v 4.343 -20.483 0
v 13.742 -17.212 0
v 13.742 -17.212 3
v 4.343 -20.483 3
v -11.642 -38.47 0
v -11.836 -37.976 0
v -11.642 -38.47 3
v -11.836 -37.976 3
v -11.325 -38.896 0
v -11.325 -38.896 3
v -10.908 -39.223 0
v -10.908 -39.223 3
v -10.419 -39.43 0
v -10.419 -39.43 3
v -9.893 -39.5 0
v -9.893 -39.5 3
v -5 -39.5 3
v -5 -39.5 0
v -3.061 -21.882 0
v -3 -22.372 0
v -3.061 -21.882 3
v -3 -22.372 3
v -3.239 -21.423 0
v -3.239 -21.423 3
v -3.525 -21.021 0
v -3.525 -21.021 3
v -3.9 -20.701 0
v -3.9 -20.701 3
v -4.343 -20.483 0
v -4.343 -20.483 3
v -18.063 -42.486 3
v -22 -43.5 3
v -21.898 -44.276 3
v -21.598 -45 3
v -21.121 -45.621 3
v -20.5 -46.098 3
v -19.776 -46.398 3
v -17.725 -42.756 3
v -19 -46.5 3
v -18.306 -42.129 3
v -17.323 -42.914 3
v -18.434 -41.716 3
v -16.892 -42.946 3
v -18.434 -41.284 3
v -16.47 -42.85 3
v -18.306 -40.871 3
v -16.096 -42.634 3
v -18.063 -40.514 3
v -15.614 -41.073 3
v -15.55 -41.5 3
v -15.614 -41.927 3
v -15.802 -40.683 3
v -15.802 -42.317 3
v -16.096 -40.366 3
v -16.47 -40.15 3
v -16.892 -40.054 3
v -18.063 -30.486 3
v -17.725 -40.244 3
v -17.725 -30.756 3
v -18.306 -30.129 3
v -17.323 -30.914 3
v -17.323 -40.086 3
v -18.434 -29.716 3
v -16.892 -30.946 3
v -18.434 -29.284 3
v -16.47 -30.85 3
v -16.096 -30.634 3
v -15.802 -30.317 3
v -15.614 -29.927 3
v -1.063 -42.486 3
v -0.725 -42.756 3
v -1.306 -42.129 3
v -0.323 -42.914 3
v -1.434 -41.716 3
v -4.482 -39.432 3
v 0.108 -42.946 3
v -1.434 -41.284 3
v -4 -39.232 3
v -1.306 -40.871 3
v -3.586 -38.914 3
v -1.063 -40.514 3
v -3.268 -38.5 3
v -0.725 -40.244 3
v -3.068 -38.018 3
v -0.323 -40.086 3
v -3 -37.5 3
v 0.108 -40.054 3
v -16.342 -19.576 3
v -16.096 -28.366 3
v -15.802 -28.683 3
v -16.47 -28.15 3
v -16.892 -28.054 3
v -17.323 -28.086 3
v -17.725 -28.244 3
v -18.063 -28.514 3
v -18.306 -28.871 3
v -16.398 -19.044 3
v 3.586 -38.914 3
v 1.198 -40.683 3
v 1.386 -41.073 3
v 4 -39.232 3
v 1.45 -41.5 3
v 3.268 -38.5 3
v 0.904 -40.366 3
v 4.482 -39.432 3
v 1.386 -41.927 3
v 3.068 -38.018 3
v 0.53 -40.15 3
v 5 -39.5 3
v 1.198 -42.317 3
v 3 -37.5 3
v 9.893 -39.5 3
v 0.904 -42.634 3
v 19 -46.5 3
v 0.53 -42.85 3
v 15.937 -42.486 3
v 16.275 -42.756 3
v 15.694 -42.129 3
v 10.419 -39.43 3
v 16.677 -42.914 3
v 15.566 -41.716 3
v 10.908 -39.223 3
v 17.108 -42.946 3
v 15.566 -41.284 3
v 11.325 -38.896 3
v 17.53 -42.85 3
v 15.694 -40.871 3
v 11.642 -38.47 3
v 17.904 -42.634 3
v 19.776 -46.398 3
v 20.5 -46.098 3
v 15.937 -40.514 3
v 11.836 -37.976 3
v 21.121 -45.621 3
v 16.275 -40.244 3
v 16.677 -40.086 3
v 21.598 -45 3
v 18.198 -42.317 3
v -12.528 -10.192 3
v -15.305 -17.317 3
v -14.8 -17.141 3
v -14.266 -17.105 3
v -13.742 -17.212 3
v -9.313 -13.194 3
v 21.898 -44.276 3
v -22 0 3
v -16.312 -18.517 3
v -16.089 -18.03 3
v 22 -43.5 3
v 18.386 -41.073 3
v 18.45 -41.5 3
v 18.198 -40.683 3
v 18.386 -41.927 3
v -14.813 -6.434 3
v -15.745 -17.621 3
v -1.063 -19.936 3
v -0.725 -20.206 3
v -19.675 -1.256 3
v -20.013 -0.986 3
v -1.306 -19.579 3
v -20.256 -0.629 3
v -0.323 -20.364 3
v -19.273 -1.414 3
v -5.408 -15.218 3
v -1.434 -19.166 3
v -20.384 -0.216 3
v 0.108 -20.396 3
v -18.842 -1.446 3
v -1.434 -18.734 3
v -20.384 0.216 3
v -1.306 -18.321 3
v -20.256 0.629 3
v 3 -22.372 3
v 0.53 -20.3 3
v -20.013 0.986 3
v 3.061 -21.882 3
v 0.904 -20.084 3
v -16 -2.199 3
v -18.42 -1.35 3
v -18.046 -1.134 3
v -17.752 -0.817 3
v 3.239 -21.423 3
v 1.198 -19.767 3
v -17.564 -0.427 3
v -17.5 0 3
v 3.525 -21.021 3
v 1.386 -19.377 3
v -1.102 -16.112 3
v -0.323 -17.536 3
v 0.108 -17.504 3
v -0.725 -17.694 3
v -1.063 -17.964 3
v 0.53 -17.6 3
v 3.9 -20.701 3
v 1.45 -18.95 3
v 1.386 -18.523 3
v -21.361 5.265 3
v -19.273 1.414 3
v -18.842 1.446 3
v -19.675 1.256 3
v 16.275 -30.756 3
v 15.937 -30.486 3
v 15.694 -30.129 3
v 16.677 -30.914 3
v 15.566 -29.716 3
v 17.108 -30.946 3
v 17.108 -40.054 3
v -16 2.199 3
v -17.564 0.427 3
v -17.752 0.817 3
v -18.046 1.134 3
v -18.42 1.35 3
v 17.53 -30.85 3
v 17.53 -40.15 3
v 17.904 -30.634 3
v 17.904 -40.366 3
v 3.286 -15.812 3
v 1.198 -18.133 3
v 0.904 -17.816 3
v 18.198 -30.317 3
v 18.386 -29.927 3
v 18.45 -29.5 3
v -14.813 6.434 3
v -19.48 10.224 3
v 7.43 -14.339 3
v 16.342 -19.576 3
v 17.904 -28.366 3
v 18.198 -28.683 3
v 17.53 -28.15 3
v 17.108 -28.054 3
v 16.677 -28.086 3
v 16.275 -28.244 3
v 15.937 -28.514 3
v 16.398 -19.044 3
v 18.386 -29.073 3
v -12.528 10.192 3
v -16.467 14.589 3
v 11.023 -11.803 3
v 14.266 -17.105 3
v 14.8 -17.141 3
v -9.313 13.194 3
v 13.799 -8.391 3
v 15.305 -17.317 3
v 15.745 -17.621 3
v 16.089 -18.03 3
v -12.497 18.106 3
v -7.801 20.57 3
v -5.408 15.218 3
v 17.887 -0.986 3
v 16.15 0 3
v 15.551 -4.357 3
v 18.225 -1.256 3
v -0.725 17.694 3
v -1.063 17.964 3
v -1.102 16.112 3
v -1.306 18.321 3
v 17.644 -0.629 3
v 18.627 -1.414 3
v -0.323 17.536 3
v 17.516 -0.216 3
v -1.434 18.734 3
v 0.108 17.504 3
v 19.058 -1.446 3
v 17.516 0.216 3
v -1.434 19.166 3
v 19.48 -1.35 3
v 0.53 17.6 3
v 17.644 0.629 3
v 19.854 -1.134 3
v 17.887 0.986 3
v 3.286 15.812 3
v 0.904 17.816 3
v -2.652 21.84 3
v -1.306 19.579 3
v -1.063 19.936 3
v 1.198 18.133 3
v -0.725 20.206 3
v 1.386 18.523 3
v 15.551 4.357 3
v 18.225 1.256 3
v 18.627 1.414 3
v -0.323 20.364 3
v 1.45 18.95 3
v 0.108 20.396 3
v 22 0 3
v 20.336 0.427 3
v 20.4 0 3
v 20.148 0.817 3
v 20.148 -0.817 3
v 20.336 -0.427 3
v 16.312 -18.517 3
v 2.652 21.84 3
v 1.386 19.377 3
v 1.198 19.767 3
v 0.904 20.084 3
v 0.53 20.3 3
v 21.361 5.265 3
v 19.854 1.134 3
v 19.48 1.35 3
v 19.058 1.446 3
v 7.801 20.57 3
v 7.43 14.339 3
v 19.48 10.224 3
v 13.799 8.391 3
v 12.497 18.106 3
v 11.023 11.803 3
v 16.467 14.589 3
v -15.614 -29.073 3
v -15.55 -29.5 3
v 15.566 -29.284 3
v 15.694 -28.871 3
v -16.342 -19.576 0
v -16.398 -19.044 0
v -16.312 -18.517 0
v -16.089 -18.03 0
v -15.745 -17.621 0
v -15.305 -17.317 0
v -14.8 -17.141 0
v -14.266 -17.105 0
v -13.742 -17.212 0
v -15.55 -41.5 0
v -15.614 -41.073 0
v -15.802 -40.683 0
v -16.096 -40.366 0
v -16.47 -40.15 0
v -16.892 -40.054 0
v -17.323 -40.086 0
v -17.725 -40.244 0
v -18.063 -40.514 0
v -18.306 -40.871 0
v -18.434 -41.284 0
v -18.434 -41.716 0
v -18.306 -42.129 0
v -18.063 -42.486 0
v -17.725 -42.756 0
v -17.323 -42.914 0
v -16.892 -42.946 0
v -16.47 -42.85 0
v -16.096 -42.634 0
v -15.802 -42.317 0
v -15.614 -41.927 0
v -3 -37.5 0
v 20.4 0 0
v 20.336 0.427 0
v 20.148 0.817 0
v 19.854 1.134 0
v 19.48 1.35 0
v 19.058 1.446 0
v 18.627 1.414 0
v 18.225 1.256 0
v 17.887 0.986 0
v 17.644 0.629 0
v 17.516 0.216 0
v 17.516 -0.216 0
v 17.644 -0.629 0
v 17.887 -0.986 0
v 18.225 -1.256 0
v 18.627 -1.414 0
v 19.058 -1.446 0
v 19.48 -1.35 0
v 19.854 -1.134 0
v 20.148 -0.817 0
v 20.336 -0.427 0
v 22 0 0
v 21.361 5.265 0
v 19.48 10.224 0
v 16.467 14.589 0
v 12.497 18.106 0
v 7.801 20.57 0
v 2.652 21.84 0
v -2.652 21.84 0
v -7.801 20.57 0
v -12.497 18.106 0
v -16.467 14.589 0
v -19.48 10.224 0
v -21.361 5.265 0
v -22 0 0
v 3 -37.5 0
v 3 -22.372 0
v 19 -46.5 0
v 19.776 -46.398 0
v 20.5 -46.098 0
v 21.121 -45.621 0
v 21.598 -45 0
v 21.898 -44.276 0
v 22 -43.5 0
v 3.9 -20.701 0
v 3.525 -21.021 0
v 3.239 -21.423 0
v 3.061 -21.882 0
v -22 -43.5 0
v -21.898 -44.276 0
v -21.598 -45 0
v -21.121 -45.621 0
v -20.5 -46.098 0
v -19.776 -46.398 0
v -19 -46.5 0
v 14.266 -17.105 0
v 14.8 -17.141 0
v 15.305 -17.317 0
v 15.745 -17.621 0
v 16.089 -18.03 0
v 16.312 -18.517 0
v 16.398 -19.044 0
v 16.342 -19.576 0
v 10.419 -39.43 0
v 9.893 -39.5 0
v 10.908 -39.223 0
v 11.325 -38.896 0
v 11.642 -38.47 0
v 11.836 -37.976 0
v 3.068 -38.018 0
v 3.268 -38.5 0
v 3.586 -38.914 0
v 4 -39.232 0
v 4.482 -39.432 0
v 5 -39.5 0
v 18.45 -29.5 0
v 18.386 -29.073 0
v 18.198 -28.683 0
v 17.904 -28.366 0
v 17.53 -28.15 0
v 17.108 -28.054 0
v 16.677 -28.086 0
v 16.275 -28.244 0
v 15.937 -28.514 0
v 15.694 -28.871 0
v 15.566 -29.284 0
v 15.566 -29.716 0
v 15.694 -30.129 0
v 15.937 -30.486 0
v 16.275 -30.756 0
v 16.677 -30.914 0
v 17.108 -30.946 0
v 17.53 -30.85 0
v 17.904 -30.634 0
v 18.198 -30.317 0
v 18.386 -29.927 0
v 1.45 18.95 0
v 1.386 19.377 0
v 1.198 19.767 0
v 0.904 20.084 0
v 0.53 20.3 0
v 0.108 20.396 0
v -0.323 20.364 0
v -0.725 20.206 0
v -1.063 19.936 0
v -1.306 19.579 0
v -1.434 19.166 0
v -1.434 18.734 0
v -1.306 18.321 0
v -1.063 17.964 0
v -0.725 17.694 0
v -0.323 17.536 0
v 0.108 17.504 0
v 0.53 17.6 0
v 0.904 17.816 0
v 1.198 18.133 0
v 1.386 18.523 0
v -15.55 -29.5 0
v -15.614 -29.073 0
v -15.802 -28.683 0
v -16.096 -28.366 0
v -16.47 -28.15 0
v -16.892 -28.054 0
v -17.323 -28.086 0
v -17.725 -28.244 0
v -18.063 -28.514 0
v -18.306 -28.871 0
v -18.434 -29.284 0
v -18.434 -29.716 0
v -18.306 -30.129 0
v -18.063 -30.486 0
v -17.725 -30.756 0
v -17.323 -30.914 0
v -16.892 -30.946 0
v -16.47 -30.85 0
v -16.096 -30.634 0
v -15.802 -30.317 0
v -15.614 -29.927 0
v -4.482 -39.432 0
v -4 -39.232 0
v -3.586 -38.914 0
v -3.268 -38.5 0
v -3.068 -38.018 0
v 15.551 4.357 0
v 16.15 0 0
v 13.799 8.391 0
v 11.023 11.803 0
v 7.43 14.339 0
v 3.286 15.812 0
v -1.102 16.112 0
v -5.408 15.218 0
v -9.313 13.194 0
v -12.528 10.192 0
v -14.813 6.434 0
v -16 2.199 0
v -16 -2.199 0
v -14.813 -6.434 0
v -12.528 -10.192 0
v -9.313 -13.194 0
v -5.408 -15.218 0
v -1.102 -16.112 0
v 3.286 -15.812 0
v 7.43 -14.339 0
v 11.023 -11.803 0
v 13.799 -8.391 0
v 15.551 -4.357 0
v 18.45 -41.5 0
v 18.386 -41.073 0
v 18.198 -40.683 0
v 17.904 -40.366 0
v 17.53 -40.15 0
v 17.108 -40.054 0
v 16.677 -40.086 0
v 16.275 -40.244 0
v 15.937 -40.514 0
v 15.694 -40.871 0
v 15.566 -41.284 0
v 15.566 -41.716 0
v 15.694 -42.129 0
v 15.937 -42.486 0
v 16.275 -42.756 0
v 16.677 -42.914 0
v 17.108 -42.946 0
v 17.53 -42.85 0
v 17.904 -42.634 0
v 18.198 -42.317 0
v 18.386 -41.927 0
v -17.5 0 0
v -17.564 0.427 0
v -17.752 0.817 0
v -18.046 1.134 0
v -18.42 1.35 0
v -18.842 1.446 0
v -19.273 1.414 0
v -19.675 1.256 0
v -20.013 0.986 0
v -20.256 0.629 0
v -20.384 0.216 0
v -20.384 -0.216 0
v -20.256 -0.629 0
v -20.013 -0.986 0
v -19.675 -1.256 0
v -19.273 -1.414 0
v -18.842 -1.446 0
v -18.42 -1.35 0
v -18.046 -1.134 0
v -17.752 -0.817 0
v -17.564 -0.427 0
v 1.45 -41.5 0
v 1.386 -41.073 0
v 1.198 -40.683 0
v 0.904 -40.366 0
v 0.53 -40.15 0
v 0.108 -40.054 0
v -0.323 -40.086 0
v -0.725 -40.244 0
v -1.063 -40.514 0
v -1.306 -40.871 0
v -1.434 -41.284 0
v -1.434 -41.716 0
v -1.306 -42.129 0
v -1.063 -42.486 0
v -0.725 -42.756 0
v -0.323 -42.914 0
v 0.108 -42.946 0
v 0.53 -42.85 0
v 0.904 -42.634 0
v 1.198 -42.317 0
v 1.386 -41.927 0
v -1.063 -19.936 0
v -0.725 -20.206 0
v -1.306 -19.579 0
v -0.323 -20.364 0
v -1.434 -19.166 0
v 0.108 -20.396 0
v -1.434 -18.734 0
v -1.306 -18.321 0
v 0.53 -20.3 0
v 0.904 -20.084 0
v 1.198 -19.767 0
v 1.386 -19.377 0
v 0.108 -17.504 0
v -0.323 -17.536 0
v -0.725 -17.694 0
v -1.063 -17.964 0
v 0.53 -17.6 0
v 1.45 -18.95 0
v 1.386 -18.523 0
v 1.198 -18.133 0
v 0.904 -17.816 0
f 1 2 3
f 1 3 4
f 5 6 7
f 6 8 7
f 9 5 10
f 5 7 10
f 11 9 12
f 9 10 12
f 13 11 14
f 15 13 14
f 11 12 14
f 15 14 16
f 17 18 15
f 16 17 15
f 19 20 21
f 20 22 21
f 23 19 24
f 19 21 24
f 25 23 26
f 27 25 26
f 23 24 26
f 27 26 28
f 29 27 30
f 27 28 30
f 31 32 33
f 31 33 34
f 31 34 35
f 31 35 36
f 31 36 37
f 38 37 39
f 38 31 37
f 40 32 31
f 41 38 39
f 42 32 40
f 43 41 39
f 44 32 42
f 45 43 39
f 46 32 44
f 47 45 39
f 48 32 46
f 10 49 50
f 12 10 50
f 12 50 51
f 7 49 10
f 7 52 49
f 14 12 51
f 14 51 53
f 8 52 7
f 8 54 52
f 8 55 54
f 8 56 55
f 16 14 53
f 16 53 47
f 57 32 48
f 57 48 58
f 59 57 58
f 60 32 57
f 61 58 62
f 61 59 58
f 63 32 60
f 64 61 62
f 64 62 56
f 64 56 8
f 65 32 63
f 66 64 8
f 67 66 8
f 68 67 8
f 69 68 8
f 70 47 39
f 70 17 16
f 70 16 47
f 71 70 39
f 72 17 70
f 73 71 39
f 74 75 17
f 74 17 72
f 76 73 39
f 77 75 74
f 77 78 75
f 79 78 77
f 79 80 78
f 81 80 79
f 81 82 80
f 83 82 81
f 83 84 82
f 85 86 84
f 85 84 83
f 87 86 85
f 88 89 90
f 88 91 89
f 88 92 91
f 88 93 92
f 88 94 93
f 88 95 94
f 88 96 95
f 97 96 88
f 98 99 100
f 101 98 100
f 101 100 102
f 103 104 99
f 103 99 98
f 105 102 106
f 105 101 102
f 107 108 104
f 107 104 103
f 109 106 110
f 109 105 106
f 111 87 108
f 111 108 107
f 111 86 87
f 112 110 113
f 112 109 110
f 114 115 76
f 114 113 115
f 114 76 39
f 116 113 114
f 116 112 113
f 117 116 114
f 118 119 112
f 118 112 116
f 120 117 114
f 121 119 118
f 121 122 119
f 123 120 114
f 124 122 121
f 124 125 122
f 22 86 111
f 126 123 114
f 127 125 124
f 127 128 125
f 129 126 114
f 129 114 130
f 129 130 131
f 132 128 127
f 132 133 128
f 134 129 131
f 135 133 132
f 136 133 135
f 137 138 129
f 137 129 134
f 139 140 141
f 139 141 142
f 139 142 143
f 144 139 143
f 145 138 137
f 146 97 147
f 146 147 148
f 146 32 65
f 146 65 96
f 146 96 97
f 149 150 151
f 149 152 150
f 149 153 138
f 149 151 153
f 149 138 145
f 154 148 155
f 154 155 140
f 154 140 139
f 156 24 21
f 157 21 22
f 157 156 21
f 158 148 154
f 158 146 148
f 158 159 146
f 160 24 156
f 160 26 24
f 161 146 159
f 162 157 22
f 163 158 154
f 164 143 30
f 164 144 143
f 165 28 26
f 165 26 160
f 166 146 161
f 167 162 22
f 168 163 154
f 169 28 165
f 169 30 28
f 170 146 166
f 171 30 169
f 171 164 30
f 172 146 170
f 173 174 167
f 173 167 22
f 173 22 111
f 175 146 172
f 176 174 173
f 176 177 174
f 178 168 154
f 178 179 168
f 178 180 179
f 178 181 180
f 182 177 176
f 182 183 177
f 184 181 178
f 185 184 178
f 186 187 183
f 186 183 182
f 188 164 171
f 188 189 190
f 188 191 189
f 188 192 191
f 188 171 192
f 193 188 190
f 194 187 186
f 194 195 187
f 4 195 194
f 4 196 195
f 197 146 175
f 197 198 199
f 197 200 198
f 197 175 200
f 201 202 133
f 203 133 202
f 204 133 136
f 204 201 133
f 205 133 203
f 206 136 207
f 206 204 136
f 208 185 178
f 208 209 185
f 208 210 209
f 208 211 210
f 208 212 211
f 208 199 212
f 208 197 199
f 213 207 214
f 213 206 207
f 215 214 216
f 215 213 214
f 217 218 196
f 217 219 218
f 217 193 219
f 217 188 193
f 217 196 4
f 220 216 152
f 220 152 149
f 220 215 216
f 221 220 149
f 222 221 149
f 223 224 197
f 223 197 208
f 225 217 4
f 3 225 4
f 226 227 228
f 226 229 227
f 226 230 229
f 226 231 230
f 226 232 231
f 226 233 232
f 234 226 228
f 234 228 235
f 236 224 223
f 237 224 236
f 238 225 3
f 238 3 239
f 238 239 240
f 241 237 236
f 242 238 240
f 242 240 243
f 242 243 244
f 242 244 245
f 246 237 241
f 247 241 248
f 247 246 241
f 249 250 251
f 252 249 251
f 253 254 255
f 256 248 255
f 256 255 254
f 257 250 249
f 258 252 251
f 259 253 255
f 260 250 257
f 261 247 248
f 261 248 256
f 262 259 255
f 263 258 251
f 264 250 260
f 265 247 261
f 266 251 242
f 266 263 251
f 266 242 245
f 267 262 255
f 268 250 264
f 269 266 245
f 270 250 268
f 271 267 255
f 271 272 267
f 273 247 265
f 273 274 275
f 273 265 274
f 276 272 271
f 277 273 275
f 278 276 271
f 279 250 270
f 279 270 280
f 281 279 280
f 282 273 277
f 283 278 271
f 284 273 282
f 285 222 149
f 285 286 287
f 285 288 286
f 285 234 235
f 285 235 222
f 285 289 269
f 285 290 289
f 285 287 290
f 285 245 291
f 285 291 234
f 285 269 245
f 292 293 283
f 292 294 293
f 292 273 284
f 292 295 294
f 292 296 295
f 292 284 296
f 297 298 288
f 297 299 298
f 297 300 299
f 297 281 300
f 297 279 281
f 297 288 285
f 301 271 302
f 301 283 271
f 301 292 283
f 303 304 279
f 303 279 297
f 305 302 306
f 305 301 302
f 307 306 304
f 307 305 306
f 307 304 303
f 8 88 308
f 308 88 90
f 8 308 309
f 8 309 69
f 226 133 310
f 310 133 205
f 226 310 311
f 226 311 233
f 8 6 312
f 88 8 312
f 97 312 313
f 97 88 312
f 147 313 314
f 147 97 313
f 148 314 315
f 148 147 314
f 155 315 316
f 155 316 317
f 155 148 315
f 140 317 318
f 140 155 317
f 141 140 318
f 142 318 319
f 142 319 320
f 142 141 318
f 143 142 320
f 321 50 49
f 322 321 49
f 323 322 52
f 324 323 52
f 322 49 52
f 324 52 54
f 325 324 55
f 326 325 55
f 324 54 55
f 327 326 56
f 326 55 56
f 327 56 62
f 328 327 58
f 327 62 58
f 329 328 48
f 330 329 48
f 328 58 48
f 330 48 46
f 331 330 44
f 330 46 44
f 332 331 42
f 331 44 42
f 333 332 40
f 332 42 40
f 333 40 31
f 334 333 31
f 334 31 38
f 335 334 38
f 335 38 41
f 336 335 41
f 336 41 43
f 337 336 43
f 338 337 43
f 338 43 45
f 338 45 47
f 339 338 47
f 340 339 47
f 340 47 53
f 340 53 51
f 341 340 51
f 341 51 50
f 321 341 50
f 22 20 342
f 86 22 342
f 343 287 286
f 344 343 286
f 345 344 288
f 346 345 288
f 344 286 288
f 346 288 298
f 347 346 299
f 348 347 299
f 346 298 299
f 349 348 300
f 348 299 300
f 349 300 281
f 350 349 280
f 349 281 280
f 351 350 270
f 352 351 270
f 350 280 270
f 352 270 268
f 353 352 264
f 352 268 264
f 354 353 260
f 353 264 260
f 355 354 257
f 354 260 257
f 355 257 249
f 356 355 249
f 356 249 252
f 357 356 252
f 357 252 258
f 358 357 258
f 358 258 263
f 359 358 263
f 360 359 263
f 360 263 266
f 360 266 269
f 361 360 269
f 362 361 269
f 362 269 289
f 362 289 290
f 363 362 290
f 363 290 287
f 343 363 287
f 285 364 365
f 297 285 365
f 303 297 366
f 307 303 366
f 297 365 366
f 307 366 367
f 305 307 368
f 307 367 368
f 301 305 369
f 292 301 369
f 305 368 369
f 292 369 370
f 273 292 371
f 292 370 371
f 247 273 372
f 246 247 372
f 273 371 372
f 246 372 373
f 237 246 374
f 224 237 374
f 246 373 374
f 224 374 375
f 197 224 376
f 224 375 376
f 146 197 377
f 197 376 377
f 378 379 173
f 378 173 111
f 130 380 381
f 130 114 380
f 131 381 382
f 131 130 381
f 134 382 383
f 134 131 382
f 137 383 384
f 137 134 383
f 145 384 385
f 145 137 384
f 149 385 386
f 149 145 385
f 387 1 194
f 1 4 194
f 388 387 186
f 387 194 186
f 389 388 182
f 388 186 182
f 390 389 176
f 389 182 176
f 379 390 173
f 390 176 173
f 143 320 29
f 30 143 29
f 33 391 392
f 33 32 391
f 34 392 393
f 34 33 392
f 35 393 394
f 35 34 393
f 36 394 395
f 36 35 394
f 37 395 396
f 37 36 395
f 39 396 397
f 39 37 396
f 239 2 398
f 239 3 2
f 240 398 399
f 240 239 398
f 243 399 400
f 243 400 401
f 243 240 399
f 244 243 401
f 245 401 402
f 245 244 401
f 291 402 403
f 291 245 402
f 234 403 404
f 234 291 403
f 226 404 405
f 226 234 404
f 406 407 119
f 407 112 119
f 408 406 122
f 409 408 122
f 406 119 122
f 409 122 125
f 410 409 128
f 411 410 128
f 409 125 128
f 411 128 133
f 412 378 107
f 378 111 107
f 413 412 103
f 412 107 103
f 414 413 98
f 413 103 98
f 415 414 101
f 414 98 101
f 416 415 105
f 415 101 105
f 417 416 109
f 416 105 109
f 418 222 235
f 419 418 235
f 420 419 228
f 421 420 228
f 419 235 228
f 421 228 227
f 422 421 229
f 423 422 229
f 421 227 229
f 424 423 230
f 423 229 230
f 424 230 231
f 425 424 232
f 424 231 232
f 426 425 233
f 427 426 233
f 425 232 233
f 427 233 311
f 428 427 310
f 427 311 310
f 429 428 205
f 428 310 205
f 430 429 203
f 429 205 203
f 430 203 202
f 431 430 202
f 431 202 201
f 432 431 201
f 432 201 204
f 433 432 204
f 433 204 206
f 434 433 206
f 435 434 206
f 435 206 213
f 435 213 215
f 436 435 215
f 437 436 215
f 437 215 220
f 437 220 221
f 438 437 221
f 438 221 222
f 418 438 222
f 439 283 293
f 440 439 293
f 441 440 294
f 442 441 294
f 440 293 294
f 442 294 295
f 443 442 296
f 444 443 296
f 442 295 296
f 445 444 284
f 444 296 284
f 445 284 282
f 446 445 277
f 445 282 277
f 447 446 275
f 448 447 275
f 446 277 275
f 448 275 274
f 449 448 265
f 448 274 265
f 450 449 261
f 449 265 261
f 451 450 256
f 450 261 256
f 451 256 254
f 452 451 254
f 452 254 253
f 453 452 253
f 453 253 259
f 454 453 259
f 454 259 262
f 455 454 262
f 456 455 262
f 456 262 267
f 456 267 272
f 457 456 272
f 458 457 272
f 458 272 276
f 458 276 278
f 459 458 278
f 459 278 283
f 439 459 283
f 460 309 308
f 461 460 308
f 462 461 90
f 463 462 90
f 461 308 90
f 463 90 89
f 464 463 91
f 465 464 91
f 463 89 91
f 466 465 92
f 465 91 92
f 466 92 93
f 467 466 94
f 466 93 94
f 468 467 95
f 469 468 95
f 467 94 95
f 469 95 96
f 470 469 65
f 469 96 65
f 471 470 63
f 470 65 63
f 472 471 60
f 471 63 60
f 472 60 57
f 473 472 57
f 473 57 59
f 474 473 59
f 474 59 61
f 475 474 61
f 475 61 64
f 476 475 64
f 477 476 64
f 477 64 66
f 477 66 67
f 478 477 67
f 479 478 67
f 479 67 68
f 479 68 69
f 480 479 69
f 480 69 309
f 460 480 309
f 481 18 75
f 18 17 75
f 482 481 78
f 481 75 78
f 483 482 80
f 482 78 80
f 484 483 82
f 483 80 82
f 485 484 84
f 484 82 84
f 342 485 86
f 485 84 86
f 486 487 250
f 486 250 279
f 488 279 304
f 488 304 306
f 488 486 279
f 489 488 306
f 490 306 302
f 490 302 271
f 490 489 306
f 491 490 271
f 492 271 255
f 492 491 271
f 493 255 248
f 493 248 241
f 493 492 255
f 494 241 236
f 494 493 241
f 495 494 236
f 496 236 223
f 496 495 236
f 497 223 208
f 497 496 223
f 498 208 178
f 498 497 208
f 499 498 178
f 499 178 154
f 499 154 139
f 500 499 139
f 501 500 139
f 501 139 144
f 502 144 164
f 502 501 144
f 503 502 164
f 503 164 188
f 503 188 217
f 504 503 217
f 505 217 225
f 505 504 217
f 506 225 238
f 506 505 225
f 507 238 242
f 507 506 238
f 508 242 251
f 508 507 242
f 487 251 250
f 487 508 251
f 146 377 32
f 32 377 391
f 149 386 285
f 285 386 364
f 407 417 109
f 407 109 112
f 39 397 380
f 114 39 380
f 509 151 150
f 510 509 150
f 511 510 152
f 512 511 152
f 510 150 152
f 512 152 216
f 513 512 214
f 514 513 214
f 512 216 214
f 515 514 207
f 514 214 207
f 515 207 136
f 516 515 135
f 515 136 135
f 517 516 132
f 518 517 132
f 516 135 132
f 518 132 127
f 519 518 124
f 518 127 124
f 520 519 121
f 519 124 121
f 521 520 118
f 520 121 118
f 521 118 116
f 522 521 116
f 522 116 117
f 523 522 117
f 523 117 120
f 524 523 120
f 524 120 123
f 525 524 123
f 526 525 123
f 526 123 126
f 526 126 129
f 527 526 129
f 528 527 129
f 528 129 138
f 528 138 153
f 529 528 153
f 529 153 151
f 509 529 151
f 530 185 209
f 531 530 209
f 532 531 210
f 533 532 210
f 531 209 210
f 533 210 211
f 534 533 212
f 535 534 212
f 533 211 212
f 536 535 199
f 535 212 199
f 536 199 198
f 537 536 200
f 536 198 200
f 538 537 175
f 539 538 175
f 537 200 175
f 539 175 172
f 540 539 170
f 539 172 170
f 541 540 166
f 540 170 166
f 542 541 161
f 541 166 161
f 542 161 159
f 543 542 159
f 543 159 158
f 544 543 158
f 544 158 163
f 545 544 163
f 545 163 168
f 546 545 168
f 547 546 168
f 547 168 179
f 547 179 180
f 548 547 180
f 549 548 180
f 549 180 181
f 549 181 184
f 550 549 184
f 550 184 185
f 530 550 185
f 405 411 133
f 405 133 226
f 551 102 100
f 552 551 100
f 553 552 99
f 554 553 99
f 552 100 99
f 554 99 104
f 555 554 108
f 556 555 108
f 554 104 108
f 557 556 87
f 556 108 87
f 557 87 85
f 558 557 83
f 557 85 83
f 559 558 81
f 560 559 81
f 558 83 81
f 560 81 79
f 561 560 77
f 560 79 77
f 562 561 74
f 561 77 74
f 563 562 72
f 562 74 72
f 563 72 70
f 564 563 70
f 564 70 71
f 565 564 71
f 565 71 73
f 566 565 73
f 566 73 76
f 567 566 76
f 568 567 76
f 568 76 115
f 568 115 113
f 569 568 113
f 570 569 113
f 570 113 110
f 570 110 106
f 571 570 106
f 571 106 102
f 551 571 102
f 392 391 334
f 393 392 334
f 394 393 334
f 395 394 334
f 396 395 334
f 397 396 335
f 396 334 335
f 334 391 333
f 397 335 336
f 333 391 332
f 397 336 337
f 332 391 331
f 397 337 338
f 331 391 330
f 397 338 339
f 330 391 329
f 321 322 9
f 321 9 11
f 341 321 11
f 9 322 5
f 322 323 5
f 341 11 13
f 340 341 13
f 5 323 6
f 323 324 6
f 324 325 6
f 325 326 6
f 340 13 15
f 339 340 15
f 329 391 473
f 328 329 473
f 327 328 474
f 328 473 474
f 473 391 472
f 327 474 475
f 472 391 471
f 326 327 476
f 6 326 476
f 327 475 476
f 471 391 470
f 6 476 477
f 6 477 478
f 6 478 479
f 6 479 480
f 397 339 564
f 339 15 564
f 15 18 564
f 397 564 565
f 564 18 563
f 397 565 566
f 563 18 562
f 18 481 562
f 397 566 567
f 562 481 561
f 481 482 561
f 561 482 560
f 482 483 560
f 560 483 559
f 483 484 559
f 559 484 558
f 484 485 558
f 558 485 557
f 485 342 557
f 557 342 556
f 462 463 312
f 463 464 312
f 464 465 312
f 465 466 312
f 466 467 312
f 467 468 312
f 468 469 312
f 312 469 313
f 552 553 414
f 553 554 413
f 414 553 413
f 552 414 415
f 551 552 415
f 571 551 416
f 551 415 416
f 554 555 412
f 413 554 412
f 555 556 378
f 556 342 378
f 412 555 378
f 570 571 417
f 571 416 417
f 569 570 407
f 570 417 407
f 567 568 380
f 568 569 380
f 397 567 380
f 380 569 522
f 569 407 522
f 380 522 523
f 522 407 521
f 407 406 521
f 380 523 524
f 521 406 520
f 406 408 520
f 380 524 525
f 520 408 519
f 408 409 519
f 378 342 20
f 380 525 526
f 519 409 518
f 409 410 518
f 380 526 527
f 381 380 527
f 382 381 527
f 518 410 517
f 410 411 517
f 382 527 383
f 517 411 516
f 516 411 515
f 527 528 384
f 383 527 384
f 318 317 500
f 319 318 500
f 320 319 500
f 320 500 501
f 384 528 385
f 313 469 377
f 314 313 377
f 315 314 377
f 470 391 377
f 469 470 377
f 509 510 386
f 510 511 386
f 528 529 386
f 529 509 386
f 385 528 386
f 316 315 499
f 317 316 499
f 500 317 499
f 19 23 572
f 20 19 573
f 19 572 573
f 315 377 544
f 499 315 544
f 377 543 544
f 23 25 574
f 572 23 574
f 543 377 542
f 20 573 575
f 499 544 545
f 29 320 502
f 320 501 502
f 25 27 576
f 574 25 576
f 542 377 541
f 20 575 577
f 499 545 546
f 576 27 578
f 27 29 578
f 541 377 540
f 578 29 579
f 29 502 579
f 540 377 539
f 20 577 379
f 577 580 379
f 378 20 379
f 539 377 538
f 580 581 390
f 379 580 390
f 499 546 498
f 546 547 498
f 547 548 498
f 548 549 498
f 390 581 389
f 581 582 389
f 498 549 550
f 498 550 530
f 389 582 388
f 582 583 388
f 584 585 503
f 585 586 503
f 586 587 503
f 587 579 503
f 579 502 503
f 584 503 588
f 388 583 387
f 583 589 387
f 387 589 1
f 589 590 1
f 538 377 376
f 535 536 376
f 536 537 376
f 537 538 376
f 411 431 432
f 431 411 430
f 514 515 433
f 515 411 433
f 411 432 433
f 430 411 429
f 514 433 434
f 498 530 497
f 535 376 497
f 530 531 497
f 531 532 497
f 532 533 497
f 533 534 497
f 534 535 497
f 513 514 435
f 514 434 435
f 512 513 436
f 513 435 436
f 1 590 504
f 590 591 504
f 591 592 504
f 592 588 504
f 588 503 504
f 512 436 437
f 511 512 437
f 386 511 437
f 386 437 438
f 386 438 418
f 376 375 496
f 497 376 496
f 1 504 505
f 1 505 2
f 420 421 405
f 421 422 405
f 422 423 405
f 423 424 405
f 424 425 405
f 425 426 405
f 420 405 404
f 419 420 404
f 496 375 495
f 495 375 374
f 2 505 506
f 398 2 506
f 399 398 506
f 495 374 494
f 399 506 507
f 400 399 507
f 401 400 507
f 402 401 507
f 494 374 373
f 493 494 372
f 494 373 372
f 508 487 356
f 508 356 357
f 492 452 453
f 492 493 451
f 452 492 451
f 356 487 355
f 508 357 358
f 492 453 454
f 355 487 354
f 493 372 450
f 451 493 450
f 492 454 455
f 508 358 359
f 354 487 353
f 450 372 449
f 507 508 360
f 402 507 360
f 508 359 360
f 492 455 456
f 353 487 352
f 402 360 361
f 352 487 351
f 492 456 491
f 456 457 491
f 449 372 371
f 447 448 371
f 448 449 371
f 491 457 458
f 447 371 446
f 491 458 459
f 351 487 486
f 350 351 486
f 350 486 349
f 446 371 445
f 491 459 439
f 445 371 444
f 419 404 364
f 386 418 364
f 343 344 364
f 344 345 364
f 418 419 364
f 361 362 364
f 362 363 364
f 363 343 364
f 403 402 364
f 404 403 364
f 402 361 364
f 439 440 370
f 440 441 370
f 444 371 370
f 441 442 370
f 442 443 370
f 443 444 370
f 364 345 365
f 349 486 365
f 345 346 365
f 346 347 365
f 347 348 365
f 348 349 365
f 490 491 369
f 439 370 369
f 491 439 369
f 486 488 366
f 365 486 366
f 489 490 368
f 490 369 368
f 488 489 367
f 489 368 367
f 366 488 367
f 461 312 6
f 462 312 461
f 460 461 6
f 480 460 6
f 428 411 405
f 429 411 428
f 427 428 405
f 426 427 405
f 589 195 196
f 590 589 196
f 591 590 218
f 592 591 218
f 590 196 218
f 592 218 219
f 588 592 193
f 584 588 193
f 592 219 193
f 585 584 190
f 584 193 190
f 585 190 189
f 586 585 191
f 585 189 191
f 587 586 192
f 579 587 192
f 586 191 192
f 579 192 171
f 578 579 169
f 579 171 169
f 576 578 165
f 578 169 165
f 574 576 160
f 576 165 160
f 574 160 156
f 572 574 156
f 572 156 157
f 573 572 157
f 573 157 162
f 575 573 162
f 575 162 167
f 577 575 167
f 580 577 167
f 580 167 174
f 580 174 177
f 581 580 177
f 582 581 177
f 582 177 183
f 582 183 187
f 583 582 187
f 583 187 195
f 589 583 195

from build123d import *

# Parameters (mm, degrees)
SKETCH_1_R          = 16.15
EXTRUDE_1_DEPTH     = 3
SKETCH_2_R          = 1.45
CUT_EXTRUDE_1_DEPTH = 5
FILLET_1_R          = 3
CUT_EXTRUDE_2_DEPTH = 52.529117982
FILLET_2_R          = 2


with BuildPart() as part:
    # 草图1 → 凸台-拉伸1 (new body)
    with BuildSketch(Plane.XY):
        with BuildLine():
            Line((-22, 0), (-22, -46.5))
            Line((-22, -46.5), (22, -46.5))
            Line((22, -46.5), (22, 0))
            ThreePointArc((22, 0), (0, 22), (-22, 0))
        make_face()
        Circle(SKETCH_1_R, mode=Mode.SUBTRACT)
    extrude(amount=EXTRUDE_1_DEPTH)

    # 草图2 → 切除-拉伸1 (cut)
    with BuildSketch(Plane.XY.offset(3)):
        with Locations((0, -41.5)):
            Circle(SKETCH_2_R)
        with Locations((17, -41.5)):
            Circle(SKETCH_2_R)
        with Locations((-17, -41.5)):
            Circle(SKETCH_2_R)
        with Locations((0, 18.95)):
            Circle(SKETCH_2_R)
        with Locations((18.95, 0)):
            Circle(SKETCH_2_R)
        with Locations((0, -18.95)):
            Circle(SKETCH_2_R)
        with Locations((-18.95, 0)):
            Circle(SKETCH_2_R)
        with Locations((-17, -29.5)):
            Circle(SKETCH_2_R)
        with Locations((17, -29.5)):
            Circle(SKETCH_2_R)
    extrude(amount=-CUT_EXTRUDE_1_DEPTH, mode=Mode.SUBTRACT)

    # 圆角1
    fillet_1_edges = [part.edges().sort_by_distance(p)[0] for p in [
        (22, -46.5, 1.5),
        (-22, -46.5, 1.5),
    ]]
    fillet(fillet_1_edges, radius=FILLET_1_R)

    # 草图3 → 切除-拉伸2 (cut, through all)
    with BuildSketch(Plane(origin=(0, 0, 0), x_dir=(-1, 0, 0), z_dir=(0, 0, -1))):
        Polygon((-17.217121795, -16.002095348), (-3, -20.95), (-3, -39.5), (-11.462229393, -39.5), align=None)
        Polygon((17.217121795, -16.002095348), (3, -20.95), (3, -39.5), (11.462229393, -39.5), align=None)
    extrude(amount=-CUT_EXTRUDE_2_DEPTH, mode=Mode.SUBTRACT)

    # 圆角2
    fillet_2_edges = [part.edges().sort_by_distance(p)[0] for p in [
        (11.462229393, -39.5, 1.5),
        (17.217121795, -16.002095348, 1.5),
        (3, -20.95, 1.5),
        (3, -39.5, 1.5),
        (-3, -39.5, 1.5),
        (-3, -20.95, 1.5),
        (-17.217121795, -16.002095348, 1.5),
        (-11.462229393, -39.5, 1.5),
    ]]
    fillet(fillet_2_edges, radius=FILLET_2_R)


solid = part.part
